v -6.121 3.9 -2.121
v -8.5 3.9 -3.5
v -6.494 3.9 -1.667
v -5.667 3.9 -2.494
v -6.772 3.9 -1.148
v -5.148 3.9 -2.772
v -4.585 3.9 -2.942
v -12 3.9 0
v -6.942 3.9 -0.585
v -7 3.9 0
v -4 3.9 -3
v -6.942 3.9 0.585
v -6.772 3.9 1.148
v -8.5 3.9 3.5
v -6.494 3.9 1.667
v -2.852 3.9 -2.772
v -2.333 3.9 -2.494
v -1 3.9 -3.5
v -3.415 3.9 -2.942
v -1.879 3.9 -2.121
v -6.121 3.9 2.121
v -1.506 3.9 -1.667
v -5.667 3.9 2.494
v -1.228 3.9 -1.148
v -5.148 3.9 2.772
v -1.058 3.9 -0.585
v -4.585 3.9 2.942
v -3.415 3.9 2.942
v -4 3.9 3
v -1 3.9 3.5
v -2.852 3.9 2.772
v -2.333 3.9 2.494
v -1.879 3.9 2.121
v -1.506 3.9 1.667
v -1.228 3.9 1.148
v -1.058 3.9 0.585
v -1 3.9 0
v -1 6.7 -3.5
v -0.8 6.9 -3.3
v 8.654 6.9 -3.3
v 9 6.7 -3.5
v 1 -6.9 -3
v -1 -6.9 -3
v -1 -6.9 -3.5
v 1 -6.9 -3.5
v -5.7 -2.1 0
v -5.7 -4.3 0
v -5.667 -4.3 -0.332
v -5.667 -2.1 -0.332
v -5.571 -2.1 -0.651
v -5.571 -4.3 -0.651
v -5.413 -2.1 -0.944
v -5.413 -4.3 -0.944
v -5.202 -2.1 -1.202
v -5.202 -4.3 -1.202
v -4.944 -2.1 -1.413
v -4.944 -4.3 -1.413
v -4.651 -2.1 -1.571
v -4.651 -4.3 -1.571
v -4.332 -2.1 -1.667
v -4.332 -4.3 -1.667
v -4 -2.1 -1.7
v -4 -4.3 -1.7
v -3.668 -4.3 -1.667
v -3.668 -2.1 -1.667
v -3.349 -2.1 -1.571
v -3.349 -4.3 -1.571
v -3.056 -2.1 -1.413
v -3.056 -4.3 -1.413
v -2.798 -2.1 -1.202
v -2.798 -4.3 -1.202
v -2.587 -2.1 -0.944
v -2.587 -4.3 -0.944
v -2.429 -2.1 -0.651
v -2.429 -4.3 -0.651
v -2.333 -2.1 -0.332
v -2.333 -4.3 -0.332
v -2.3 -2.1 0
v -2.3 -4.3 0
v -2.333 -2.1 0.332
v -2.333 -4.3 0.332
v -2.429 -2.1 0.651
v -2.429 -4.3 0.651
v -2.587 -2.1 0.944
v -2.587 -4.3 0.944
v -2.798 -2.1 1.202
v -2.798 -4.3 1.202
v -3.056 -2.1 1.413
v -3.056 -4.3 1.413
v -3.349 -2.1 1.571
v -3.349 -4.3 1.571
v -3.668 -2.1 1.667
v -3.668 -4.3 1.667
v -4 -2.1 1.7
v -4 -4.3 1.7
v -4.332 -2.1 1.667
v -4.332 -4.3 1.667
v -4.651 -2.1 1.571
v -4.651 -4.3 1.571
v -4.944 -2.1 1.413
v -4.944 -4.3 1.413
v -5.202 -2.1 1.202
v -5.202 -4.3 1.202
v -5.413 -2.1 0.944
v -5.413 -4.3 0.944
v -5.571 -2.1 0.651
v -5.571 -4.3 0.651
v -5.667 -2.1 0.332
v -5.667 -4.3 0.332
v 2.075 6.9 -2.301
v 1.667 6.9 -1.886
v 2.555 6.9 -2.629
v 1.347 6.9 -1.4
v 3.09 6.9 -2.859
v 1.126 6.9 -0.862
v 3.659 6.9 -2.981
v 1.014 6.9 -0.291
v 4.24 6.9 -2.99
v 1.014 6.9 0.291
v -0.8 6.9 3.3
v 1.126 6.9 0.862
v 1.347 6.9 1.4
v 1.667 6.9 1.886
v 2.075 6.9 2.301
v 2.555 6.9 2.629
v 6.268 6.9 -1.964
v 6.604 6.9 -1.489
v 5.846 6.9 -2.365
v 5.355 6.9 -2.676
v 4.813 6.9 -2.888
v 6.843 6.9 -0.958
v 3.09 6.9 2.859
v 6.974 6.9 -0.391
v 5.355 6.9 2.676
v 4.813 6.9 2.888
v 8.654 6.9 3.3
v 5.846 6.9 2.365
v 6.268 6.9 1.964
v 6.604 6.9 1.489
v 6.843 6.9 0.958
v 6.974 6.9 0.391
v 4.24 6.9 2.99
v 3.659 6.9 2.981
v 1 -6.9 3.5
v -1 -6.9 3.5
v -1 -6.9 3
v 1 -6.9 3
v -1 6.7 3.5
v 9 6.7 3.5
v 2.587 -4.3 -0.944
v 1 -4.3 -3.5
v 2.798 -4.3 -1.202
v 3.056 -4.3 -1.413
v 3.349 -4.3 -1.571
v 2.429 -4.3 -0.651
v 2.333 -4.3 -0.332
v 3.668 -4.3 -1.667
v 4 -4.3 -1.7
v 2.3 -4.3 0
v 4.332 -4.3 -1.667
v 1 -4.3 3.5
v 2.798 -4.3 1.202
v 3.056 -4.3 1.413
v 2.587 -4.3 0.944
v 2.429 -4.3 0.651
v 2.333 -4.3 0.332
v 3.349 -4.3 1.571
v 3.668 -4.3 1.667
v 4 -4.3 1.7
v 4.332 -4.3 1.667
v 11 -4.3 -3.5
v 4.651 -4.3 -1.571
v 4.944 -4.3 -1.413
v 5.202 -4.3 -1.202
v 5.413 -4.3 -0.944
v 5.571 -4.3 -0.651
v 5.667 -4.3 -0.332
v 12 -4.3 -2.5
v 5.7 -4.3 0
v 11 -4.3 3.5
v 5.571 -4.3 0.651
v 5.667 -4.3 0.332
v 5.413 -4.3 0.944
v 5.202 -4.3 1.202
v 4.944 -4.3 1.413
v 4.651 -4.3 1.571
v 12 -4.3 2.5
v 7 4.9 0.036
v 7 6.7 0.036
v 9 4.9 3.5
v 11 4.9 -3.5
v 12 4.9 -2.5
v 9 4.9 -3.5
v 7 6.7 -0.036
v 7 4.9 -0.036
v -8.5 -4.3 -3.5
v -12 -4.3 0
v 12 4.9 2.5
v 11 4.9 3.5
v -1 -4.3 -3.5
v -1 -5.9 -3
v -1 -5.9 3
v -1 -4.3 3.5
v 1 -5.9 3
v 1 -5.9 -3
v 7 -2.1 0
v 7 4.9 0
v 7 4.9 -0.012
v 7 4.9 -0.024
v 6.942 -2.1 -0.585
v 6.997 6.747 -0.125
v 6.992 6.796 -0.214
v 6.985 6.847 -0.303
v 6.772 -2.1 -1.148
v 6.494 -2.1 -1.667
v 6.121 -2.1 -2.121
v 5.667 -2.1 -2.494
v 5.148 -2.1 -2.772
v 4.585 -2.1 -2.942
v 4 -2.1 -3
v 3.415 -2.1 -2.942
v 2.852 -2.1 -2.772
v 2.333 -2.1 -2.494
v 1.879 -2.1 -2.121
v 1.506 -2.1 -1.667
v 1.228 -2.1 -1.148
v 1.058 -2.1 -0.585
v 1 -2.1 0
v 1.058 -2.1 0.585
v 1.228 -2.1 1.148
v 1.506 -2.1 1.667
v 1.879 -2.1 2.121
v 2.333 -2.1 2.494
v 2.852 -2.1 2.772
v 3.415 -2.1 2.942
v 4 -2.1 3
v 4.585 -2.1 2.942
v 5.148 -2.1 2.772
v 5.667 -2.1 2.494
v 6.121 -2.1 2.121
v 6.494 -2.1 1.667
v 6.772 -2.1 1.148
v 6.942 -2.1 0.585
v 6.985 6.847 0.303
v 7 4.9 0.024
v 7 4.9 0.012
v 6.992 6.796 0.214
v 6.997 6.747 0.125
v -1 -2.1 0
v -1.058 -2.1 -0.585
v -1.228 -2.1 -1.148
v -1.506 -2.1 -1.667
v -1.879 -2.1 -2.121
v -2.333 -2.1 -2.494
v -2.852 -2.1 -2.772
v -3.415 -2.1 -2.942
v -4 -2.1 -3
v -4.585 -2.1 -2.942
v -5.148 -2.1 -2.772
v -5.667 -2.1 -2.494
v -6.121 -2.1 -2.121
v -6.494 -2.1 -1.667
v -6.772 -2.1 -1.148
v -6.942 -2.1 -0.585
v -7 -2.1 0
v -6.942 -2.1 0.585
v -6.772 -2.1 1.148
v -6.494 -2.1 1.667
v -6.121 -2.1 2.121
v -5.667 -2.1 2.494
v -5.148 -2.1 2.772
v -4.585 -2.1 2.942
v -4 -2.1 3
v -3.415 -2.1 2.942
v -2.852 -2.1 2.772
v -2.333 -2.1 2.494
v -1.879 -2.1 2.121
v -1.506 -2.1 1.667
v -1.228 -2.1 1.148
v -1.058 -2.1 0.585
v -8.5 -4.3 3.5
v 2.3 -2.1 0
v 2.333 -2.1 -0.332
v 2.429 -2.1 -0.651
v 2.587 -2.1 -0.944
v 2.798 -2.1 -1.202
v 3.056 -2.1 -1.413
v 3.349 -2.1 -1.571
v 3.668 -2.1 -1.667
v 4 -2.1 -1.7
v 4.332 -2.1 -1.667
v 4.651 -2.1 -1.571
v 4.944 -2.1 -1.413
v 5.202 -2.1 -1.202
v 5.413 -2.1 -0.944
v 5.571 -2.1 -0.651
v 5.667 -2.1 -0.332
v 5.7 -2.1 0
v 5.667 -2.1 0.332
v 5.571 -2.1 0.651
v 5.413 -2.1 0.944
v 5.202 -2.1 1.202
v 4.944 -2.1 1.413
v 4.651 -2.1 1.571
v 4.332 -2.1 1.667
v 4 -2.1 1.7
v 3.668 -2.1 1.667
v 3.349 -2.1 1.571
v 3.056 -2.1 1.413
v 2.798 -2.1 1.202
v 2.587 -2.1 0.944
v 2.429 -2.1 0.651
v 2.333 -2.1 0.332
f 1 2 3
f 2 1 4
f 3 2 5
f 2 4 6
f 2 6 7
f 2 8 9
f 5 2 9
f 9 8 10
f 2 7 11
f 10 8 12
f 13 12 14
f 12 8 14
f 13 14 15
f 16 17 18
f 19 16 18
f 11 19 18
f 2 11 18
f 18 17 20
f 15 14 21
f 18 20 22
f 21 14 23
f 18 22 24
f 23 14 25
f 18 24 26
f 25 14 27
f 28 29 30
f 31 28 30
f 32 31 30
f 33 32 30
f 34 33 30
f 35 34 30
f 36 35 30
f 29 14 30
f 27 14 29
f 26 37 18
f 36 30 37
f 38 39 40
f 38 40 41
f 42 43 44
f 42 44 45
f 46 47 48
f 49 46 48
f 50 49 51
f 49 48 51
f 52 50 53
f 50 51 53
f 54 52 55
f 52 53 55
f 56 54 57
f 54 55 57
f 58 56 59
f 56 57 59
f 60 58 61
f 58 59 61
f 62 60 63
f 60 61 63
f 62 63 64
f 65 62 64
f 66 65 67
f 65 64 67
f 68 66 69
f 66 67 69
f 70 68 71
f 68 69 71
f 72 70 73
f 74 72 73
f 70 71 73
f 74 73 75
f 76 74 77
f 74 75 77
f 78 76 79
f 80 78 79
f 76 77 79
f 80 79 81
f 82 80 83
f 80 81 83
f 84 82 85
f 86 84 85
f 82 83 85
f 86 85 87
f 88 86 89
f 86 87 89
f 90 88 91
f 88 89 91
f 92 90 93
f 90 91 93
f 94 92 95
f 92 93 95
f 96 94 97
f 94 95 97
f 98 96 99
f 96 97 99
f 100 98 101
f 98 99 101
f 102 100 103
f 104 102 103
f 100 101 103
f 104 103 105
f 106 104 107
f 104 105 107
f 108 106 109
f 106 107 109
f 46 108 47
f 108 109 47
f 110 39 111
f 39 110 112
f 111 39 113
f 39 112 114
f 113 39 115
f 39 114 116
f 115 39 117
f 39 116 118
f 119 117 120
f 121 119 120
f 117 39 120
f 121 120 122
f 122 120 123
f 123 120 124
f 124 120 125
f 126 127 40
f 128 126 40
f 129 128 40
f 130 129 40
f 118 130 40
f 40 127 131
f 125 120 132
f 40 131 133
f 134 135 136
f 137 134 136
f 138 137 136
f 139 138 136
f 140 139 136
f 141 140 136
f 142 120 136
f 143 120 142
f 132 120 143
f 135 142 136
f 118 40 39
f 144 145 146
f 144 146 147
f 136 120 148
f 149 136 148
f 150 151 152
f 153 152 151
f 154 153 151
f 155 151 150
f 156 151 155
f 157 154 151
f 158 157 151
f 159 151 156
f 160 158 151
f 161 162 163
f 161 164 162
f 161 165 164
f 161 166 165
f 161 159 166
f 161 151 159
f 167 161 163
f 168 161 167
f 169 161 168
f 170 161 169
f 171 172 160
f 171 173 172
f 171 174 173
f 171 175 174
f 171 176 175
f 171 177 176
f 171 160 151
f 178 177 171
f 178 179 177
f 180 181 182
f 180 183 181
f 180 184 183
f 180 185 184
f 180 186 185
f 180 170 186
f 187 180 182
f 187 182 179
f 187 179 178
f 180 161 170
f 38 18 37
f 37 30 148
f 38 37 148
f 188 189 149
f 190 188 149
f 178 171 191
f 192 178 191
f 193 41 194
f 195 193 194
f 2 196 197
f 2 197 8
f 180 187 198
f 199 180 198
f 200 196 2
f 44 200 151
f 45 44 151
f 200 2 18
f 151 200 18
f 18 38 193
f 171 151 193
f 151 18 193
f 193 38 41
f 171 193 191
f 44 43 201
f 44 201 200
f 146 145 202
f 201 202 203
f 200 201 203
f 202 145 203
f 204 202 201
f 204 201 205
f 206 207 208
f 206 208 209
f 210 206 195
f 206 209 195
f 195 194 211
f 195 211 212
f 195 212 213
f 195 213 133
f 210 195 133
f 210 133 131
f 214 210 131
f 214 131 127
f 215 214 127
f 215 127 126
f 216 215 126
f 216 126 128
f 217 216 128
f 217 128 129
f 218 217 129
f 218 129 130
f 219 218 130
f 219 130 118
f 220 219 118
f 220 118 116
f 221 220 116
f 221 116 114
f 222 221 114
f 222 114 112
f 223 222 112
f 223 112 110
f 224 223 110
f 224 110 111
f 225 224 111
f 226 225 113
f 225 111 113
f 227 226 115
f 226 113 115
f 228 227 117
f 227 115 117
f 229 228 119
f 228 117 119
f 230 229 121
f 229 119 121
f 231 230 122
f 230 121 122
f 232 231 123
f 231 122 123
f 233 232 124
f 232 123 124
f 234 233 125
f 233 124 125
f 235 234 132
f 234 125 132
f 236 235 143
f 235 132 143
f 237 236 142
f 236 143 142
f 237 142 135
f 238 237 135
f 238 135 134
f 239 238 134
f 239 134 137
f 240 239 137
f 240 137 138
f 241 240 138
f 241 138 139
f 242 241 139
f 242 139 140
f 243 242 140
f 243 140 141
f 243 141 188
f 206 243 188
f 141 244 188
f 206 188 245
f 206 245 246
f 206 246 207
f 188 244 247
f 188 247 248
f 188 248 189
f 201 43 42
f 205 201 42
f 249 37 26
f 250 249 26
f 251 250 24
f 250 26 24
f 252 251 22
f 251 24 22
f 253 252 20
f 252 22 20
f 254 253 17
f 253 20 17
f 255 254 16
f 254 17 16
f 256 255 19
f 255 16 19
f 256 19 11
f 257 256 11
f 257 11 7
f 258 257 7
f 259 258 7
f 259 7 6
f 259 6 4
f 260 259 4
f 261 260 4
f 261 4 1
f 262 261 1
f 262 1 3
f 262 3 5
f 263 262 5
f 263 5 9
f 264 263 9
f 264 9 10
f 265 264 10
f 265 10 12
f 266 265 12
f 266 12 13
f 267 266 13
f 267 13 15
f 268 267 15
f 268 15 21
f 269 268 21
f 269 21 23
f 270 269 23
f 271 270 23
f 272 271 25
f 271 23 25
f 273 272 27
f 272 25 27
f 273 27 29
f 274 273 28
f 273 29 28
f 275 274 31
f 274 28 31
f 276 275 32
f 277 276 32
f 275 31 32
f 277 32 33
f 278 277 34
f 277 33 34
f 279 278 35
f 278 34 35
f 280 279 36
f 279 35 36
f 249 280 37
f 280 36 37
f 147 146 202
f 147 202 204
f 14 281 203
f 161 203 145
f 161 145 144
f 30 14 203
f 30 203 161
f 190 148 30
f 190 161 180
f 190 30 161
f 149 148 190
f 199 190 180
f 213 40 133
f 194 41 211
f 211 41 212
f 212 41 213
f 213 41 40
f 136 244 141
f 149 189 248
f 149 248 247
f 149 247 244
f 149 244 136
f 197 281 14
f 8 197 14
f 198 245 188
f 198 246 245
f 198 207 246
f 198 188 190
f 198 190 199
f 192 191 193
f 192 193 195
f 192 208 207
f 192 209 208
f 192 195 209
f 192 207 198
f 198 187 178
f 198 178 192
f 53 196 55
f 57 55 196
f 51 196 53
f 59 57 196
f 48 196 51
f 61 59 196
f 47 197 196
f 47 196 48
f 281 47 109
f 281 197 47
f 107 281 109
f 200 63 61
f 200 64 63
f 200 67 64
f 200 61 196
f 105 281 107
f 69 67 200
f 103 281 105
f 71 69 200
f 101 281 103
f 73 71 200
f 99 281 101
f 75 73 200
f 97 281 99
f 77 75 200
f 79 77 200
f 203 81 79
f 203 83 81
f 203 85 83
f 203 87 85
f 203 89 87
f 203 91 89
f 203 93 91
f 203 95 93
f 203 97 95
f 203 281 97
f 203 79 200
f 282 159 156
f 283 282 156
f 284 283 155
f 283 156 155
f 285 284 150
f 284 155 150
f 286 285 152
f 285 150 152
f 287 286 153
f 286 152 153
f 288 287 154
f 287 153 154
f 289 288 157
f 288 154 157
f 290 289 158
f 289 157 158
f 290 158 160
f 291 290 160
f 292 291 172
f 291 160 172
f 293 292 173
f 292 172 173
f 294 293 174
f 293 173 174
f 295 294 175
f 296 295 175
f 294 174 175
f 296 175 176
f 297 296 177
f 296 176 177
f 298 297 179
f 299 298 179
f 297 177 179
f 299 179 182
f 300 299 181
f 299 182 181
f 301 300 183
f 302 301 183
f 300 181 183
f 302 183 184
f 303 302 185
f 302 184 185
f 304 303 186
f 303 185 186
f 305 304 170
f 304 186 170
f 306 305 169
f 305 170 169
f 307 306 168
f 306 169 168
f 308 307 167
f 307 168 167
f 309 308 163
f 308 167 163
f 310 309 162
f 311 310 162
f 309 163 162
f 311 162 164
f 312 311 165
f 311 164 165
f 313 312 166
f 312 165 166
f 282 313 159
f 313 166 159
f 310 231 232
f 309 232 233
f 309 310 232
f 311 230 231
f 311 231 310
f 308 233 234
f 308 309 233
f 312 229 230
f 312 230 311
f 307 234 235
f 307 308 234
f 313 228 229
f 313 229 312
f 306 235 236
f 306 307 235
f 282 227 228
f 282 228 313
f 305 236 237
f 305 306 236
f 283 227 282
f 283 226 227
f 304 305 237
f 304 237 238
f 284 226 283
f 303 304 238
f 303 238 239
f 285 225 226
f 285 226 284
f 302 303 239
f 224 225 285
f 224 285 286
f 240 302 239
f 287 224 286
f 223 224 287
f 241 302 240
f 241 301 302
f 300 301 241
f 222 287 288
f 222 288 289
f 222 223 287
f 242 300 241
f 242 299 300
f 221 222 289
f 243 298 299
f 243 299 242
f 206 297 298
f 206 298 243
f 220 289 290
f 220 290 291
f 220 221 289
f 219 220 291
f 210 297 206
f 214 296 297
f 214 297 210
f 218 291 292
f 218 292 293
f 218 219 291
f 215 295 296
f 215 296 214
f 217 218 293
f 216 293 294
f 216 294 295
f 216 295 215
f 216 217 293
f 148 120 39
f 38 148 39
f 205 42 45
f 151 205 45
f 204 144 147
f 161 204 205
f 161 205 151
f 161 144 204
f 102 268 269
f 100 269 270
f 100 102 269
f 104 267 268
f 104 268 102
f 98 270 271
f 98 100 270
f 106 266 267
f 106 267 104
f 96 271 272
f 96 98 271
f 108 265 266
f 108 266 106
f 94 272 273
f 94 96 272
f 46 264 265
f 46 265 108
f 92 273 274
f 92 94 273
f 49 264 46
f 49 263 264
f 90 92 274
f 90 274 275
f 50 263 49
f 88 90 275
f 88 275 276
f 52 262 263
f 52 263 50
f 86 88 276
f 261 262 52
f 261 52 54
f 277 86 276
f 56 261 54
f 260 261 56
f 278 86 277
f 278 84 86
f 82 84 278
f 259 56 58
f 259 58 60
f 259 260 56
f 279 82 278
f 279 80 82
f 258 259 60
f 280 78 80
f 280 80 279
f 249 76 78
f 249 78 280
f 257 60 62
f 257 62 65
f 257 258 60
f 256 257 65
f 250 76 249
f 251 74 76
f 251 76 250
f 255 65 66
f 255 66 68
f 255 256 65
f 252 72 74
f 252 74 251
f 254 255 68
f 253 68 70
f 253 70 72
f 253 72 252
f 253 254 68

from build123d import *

# Parameters (mm, degrees)
SKETCH_1_W                = 24
SKETCH_1_H                = 13.8
EXTRUDE_1_DEPTH           = 3.5
HOLE_WIZARD_1_D           = 3.4
HOLE_WIZARD_1_CBORE_D     = 6
HOLE_WIZARD_1_CBORE_DEPTH = 9
CUT_EXTRUDE_1_DEPTH       = 2
SKETCH_5_W                = 11
SKETCH_5_H                = 2.6
SKETCH_5_H_2              = 3
CUT_EXTRUDE_2_DEPTH       = 16.511608556
SKETCH_6_W                = 2
SKETCH_6_H                = 6
CUT_EXTRUDE_3_DEPTH       = 1
CHAMFER_1_SIZE            = 3.5
CHAMFER_2_SIZE            = 0.2
CHAMFER_3_SIZE            = 1


with BuildPart() as part:
    # 草图1 → 凸台-拉伸1 (new, symmetric)
    with BuildSketch(Plane.XY):
        Rectangle(SKETCH_1_W, SKETCH_1_H)
    extrude(amount=EXTRUDE_1_DEPTH, both=True)

    # 打孔尺寸根据内六角圆柱头螺钉的类型1 (through all)
    with Locations(Plane(origin=(0, 6.9, 0), x_dir=(1, 0, 0), z_dir=(0, 1, 0))):
        with Locations((4, 0), (-4, 0)):
            CounterBoreHole(HOLE_WIZARD_1_D / 2, HOLE_WIZARD_1_CBORE_D / 2, HOLE_WIZARD_1_CBORE_DEPTH)

    # 草图4 → 切除-拉伸1 (cut)
    with BuildSketch(Plane(origin=(0, 6.9, 0), x_dir=(1, 0, 0), z_dir=(0, 1, 0))):
        Polygon((9, 3.5), (6.979274058, 0), (9, -3.5), (12, -3.5), (12, 3.5), align=None)
    extrude(amount=-CUT_EXTRUDE_1_DEPTH, mode=Mode.SUBTRACT)

    # 草图5 → 切除-拉伸2 (cut, through all)
    with BuildSketch(Plane.XY.offset(3.5)):
        with Locations((6.5, -5.6)):
            Rectangle(SKETCH_5_W, SKETCH_5_H)
        with Locations((-6.5, -5.6)):
            Rectangle(SKETCH_5_W, SKETCH_5_H)
        with Locations((-6.5, 5.4)):
            Rectangle(SKETCH_5_W, SKETCH_5_H_2)
    extrude(amount=-CUT_EXTRUDE_2_DEPTH, mode=Mode.SUBTRACT)

    # 草图6 → 切除-拉伸3 (cut)
    with BuildSketch(Plane.XZ.offset(6.9)):
        Rectangle(SKETCH_6_W, SKETCH_6_H)
    extrude(amount=-CUT_EXTRUDE_3_DEPTH, mode=Mode.SUBTRACT)

    # 倒角1
    chamfer_1_edges = [part.edges().sort_by_distance(p)[0] for p in [
        (-12, -0.2, -3.5),
        (-12, -0.2, 3.5),
    ]]
    chamfer(chamfer_1_edges, length=CHAMFER_1_SIZE - 0.0001)  # a hair under: the kernel refuses the full size

    # 倒角2
    chamfer_2_edges = [part.edges().sort_by_distance(p)[0] for p in [
        (4, 6.9, -3.5),
        (4, 6.9, 3.5),
        (7.999894775, 6.9, 1.767766937),
        (7.999894775, 6.9, -1.767766937),
        (-1, 6.9, 0),
    ]]
    chamfer(chamfer_2_edges, length=CHAMFER_2_SIZE)

    # 倒角3
    chamfer_3_edges = [part.edges().sort_by_distance(p)[0] for p in [
        (12, 0.3, -3.5),
        (12, 0.3, 3.5),
    ]]
    chamfer(chamfer_3_edges, length=CHAMFER_3_SIZE)


solid = part.part
